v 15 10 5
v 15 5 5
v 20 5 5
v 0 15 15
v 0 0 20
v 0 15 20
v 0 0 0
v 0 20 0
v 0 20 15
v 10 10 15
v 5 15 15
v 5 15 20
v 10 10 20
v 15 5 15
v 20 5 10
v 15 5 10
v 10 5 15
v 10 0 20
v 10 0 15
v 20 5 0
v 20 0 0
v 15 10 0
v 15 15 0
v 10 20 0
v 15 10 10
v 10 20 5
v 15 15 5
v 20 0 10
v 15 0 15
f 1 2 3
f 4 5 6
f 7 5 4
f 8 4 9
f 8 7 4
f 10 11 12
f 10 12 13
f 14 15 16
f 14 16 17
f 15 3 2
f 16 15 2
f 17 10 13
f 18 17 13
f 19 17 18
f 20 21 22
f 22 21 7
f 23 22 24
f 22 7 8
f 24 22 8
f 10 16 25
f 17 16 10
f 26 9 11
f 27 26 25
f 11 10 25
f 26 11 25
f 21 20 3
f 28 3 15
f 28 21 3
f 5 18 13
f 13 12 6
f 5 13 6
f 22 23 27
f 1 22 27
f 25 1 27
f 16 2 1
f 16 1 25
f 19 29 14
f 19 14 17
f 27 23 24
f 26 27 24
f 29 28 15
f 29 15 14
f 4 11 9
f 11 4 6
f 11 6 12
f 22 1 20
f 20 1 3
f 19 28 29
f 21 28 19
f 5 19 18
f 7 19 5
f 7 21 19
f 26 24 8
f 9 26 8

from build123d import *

# Parameters (mm, degrees)
BOSS_EXTRUDE1_DEPTH = 20
SKETCH2_W           = 5
SKETCH2_H           = 20
BOSS_EXTRUDE2_DEPTH = 5
CUT_EXTRUDE1_DEPTH  = 21
BOSS_EXTRUDE4_DEPTH = 20
CUT_EXTRUDE2_DEPTH  = 70
SKETCH5_W           = 5
SKETCH5_H           = 10
BOSS_EXTRUDE5_DEPTH = 5
CUT_EXTRUDE3_DEPTH  = 5
BOSS_EXTRUDE6_DEPTH = 5
BOSS_EXTRUDE7_DEPTH = 5


with BuildPart() as part:
    # Sketch1 → Boss-Extrude1 (new body)
    with BuildSketch(Plane(origin=(0, 0, 0), x_dir=(1, 0, 0), z_dir=(0, 1, 0))):
        Polygon((0, -15), (0, 0), (10, 0), (10, -5), align=None)
    extrude(amount=BOSS_EXTRUDE1_DEPTH)

    # Sketch2 → Boss-Extrude2 (add)
    with BuildSketch(Plane(origin=(10, 0, 0), x_dir=(0, 0, -1), z_dir=(1, 0, 0))):
        with Locations((-2.5, 10)):
            Rectangle(SKETCH2_W, SKETCH2_H)
    extrude(amount=BOSS_EXTRUDE2_DEPTH)

    # Sketch3 → Cut-Extrude1 (cut)
    with BuildSketch(Plane(origin=(0, 0, 0), x_dir=(-1, 0, 0), z_dir=(0, 0, -1))):
        Polygon((-10, 20), (-15, 20), (-15, 15), align=None)
    extrude(amount=-CUT_EXTRUDE1_DEPTH, mode=Mode.SUBTRACT)

    # Sketch4 → Boss-Extrude4 (add)
    with BuildSketch(Plane(origin=(0, 0, 0), x_dir=(-1, 0, 0), z_dir=(0, -1, 0))):
        Polygon((0, -15), (-10, -5), (-15, -5), (-15, -10), (-10, -15), align=None)
    extrude(amount=-BOSS_EXTRUDE4_DEPTH)

    # 3DSketch1 → Cut-Extrude2 (cut, along a direction that is not the sketch's normal)
    with BuildSketch(Plane(origin=(0, 20, 15), x_dir=(0.8017837257372734, -0.26726124191242434, -0.5345224838248487), z_dir=(-0.5773502691896257, -0.5773502691896256, -0.5773502691896261))):
        Polygon((0, 0), (13.363062096, -4.629100499), (18.708286934, 0), (17.371980724, 6.943650748), (10.690449676, 9.258200998), align=None)
    extrude(amount=-CUT_EXTRUDE2_DEPTH, dir=(-1, 0, 0), mode=Mode.SUBTRACT)

    # Sketch5 → Boss-Extrude5 (add)
    with BuildSketch(Plane(origin=(15, 0, 0), x_dir=(0, 0, -1), z_dir=(1, 0, 0))):
        with Locations((-2.5, 5)):
            Rectangle(SKETCH5_W, SKETCH5_H)
    extrude(amount=BOSS_EXTRUDE5_DEPTH)

    # Sketch6 → Cut-Extrude3 (cut)
    with BuildSketch(Plane.XY.offset(5)):
        Polygon((15, 10), (20, 5), (20, 10), align=None)
    extrude(amount=-CUT_EXTRUDE3_DEPTH, mode=Mode.SUBTRACT)

    # Sketch7 → Boss-Extrude6 (add)
    with BuildSketch(Plane(origin=(0, 0, 0), x_dir=(-1, 0, 0), z_dir=(0, -1, 0))):
        Polygon((-15, -10), (-15, -5), (-20, -5), (-20, -10), (-15, -15), (-10, -15), align=None)
    extrude(amount=-BOSS_EXTRUDE6_DEPTH)

    # Sketch8 → Boss-Extrude7 (add)
    with BuildSketch(Plane.XY.offset(15)):
        Polygon((0, 15), (5, 15), (10, 10), (10, 0), (0, 0), align=None)
    extrude(amount=BOSS_EXTRUDE7_DEPTH)


solid = part.part
